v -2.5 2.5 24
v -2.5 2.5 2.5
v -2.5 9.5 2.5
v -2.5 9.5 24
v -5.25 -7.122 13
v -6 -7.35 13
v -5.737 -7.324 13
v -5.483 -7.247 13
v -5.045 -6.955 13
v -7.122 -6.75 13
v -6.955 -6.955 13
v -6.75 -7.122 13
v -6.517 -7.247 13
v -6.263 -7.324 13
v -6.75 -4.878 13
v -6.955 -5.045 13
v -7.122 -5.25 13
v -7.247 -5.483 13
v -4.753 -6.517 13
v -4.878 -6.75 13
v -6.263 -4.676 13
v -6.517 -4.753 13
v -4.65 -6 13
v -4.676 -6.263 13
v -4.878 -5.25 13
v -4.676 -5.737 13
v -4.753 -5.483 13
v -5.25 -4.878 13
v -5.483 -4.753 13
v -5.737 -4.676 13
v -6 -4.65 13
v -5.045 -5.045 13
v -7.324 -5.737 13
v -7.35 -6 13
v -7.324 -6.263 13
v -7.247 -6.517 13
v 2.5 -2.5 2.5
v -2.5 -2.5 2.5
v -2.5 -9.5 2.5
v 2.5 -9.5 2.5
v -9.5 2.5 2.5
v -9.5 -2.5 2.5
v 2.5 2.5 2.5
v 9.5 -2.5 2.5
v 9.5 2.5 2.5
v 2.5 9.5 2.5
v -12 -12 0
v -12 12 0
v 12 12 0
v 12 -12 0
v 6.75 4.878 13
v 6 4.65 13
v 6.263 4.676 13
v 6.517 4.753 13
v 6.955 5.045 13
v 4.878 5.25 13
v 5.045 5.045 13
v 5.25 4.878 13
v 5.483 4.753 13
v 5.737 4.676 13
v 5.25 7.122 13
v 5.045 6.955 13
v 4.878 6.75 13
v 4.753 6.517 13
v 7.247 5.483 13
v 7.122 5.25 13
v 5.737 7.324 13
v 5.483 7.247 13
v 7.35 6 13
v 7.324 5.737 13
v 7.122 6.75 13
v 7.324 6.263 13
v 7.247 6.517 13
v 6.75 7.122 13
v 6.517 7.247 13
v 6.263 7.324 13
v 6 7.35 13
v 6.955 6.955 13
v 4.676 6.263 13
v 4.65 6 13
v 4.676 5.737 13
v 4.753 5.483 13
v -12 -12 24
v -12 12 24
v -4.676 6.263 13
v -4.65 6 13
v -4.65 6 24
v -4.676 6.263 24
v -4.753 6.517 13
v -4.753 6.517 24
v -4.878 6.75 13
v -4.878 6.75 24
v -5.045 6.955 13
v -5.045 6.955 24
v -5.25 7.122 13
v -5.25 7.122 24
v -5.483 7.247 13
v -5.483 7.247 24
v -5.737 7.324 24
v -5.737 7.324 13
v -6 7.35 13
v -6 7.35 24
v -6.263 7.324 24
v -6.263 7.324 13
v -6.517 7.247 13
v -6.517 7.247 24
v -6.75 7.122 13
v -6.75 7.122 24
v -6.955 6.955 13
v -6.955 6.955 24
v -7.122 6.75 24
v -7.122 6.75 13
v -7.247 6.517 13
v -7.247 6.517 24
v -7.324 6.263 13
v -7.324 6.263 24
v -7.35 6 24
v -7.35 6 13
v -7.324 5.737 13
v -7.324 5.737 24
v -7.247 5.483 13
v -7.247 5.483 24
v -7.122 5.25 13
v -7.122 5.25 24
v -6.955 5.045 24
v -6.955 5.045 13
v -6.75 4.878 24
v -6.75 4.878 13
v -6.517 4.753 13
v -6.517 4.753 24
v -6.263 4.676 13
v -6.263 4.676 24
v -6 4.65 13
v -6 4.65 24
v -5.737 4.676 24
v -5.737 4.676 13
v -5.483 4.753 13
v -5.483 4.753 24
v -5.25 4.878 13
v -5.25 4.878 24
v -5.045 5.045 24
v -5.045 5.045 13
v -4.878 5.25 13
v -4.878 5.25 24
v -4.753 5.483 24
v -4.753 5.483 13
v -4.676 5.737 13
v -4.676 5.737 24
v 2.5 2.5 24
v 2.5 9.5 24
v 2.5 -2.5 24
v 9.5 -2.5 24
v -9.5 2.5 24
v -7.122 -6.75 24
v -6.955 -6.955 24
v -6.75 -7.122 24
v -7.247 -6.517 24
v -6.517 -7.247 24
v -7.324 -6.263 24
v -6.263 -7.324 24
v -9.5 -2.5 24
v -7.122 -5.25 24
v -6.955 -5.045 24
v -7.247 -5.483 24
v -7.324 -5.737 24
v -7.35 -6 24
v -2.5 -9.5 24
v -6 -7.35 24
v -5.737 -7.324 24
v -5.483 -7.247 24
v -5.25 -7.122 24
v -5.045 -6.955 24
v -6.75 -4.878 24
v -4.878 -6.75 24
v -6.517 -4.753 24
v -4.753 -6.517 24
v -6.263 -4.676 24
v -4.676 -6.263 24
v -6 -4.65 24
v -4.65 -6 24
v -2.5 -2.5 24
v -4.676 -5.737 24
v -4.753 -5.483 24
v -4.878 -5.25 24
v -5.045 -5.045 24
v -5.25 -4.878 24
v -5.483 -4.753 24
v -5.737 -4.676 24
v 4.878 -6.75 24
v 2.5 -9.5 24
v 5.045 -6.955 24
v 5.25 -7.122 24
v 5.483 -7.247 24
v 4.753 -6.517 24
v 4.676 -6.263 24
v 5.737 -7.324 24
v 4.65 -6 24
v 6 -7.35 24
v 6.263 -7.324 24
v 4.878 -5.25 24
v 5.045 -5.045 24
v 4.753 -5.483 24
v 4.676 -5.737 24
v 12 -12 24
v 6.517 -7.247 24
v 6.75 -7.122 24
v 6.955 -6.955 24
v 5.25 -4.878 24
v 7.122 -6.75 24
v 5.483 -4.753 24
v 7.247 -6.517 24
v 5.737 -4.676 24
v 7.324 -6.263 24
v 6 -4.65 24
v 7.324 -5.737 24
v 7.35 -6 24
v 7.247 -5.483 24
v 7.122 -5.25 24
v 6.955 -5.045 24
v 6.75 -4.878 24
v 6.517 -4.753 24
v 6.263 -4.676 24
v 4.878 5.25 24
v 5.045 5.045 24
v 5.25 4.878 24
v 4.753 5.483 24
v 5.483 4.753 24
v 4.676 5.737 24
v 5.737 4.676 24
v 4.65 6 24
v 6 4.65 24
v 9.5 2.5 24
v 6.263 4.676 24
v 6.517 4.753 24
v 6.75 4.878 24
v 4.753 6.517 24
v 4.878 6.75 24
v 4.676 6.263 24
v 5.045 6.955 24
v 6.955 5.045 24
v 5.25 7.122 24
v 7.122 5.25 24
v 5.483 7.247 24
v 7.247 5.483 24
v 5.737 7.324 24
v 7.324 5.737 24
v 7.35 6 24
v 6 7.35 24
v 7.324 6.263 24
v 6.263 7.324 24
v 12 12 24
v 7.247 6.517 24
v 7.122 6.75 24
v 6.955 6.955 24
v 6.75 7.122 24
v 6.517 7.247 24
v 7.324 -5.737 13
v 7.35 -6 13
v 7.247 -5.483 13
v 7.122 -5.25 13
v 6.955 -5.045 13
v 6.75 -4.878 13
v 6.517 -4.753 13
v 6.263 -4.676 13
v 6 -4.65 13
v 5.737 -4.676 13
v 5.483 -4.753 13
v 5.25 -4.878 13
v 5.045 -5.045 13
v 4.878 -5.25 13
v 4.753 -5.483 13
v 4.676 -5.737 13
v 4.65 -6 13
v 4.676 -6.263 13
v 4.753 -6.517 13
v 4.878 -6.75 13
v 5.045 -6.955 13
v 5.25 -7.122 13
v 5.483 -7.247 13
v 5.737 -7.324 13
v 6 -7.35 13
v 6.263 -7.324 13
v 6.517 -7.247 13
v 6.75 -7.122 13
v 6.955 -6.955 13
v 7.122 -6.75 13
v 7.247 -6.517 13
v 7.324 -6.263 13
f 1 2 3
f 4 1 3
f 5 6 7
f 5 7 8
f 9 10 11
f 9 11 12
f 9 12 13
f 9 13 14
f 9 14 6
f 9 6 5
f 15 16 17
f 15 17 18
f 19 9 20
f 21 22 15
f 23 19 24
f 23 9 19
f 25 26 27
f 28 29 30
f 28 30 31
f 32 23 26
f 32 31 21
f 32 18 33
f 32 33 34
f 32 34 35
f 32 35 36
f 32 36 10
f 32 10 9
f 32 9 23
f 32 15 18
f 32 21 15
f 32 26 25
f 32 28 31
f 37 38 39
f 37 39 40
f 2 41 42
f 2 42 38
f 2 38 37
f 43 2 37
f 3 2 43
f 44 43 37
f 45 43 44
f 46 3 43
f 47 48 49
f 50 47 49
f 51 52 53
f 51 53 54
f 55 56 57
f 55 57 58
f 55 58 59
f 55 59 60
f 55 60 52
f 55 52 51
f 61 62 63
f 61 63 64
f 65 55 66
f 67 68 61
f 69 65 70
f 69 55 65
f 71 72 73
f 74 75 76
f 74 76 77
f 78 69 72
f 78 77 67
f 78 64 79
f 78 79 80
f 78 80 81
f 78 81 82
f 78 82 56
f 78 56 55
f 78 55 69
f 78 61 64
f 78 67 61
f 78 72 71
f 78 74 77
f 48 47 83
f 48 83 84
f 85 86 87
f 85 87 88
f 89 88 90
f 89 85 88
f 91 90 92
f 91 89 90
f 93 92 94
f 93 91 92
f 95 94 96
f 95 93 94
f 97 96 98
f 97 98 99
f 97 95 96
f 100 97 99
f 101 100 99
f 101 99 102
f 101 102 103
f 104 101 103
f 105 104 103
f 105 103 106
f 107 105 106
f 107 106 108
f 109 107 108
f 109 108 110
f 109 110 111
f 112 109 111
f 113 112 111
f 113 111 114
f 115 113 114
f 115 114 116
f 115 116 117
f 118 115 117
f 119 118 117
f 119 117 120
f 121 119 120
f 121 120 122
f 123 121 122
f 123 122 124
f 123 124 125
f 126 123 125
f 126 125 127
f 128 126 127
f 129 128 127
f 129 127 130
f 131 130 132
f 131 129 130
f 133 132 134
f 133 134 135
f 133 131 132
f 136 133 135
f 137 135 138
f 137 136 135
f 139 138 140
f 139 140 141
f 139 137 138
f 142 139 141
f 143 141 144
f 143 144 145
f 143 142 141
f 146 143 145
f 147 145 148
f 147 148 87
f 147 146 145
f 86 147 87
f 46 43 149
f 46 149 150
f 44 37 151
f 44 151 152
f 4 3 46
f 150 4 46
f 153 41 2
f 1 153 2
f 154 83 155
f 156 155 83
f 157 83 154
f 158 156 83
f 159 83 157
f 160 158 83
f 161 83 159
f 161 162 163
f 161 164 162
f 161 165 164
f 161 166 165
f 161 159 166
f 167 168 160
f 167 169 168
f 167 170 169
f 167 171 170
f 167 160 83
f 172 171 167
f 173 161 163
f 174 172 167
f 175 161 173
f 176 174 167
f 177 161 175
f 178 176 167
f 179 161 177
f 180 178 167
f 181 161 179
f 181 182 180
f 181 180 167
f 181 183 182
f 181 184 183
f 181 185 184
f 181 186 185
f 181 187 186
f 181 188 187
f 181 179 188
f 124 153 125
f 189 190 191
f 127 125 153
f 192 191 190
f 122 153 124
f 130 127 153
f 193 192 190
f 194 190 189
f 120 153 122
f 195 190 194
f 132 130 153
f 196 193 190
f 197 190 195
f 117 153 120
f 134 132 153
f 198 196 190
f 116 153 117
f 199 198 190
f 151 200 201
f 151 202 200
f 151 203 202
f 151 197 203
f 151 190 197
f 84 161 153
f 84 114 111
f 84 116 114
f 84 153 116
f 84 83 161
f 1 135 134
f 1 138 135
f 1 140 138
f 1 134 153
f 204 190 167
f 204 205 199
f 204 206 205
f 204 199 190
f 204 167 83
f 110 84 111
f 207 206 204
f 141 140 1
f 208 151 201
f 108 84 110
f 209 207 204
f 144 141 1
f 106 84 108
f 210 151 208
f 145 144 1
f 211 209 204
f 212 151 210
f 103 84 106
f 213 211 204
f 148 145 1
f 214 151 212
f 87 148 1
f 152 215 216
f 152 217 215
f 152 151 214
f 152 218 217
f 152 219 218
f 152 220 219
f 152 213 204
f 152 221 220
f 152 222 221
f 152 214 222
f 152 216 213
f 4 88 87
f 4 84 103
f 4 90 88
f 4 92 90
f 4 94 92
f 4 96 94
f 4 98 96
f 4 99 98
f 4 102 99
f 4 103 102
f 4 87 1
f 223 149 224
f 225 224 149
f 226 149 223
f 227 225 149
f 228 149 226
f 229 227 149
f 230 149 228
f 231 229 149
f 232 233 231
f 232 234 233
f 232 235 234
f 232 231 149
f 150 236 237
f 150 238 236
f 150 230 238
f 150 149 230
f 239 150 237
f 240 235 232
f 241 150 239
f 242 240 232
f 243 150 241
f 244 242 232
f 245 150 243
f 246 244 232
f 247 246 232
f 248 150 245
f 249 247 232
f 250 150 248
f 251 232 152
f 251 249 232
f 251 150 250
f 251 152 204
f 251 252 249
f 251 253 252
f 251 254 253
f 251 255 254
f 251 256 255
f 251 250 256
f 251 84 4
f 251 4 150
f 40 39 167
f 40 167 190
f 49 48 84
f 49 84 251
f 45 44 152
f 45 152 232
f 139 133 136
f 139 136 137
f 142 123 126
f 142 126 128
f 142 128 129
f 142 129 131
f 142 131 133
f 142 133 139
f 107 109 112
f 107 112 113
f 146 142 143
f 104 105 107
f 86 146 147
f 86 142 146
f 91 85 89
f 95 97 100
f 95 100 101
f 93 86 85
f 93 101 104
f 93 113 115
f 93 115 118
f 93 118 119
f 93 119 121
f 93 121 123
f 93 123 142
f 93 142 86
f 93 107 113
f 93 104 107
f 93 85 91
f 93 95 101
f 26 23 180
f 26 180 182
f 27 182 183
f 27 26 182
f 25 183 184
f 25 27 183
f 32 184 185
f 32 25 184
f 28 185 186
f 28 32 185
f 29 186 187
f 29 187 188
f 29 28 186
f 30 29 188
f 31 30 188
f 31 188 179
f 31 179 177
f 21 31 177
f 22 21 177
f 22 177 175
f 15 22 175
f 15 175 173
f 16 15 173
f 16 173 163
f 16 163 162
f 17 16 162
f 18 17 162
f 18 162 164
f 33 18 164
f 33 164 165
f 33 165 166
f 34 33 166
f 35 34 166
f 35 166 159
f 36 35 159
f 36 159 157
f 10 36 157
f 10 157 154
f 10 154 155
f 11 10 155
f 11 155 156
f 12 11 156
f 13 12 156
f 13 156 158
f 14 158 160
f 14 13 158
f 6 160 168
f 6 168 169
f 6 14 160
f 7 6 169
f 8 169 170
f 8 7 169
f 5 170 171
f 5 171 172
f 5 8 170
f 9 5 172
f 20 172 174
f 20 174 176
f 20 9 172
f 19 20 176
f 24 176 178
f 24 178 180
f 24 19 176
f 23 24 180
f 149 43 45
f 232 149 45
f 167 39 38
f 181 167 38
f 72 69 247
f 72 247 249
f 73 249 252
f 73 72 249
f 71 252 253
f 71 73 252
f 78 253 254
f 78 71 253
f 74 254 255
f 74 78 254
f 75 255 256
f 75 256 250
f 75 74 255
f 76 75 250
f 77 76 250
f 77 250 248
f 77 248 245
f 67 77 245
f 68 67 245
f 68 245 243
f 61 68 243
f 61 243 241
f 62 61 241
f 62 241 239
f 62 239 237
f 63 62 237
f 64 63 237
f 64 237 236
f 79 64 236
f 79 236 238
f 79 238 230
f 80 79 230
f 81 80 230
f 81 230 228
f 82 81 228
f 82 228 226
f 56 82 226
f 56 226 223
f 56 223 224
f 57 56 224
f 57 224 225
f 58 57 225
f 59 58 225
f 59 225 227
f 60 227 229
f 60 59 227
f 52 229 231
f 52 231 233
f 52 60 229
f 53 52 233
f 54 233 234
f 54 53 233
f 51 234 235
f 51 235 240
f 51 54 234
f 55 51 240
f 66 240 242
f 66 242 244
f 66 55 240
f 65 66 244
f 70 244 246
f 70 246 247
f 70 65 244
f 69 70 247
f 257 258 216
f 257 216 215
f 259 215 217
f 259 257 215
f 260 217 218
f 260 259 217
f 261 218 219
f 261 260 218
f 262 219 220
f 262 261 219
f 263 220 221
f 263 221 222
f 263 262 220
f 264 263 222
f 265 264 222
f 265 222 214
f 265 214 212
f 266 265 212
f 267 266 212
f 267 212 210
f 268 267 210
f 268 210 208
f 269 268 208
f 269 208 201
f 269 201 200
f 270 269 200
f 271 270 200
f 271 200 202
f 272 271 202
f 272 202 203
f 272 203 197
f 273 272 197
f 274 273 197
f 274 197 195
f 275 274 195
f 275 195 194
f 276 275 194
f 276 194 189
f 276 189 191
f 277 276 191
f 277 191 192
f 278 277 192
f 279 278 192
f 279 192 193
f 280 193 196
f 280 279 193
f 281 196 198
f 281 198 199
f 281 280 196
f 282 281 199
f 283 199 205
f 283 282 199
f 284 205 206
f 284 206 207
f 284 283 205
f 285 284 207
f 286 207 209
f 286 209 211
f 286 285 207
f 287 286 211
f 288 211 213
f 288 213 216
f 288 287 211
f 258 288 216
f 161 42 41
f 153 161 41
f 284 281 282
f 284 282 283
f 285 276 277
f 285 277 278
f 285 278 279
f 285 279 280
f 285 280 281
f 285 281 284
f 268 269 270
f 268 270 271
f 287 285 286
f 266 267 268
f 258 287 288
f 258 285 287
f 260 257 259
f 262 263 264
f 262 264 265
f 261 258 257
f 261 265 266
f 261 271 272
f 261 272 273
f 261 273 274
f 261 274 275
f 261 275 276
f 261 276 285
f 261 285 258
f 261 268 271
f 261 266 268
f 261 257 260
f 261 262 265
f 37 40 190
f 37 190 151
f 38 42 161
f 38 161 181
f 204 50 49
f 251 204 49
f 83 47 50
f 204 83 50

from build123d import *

# Parameters (mm, degrees)
F0_W     = 24
F0_H     = 24
F0_W_2   = 7
F0_H_2   = 7
F0_R     = 1.35
F1_DEPTH = 24
F2_T     = -2.5
F3_DEPTH = 24
F4_DEPTH = 13


with BuildPart() as f1:
    # F0 (on Top) → F1 (new body)
    with BuildSketch(Plane.XY):
        Rectangle(F0_W, F0_H)
        with Locations((-6, -6)):
            Rectangle(F0_W_2, F0_H_2, mode=Mode.SUBTRACT)
        with Locations((6, -6)):
            Rectangle(F0_W_2, F0_H_2, mode=Mode.SUBTRACT)
        with Locations((-6, 6)):
            Rectangle(F0_W_2, F0_H_2, mode=Mode.SUBTRACT)
        with Locations((6, 6)):
            Rectangle(F0_W_2, F0_H_2, mode=Mode.SUBTRACT)
        with Locations((-6, 6)):
            Rectangle(F0_W_2, F0_H_2)
        with Locations((-6, 6)):
            Circle(F0_R, mode=Mode.SUBTRACT)
        with Locations((-6, 6)):
            Circle(F0_R)
        with Locations((6, 6)):
            Rectangle(F0_W_2, F0_H_2)
        with Locations((6, 6)):
            Circle(F0_R, mode=Mode.SUBTRACT)
        with Locations((6, 6)):
            Circle(F0_R)
        with Locations((6, -6)):
            Rectangle(F0_W_2, F0_H_2)
        with Locations((6, -6)):
            Circle(F0_R, mode=Mode.SUBTRACT)
        with Locations((6, -6)):
            Circle(F0_R)
        with Locations((-6, -6)):
            Rectangle(F0_W_2, F0_H_2)
        with Locations((-6, -6)):
            Circle(F0_R, mode=Mode.SUBTRACT)
        with Locations((-6, -6)):
            Circle(F0_R)
    extrude(amount=F1_DEPTH)

    # F2
    f2_openings = [f1.faces().sort_by_distance(p)[0] for p in [
        (0, 0, 24),
    ]]
    offset(amount=F2_T, openings=f2_openings)

    # F0 (on Top) → F3 (join)
    with BuildSketch(Plane.XY):
        with Locations((-6, 6)):
            Rectangle(F0_W_2, F0_H_2)
        with Locations((-6, 6)):
            Circle(F0_R, mode=Mode.SUBTRACT)
        with Locations((-6, -6)):
            Rectangle(F0_W_2, F0_H_2)
        with Locations((-6, -6)):
            Circle(F0_R, mode=Mode.SUBTRACT)
        with Locations((6, -6)):
            Rectangle(F0_W_2, F0_H_2)
        with Locations((6, -6)):
            Circle(F0_R, mode=Mode.SUBTRACT)
        with Locations((6, 6)):
            Rectangle(F0_W_2, F0_H_2)
        with Locations((6, 6)):
            Circle(F0_R, mode=Mode.SUBTRACT)
    extrude(amount=F3_DEPTH)

    # F0 (on Top) → F4 (join)
    with BuildSketch(Plane.XY):
        with Locations((-6, 6)):
            Circle(F0_R)
        with Locations((-6, -6)):
            Circle(F0_R)
        with Locations((6, -6)):
            Circle(F0_R)
        with Locations((6, 6)):
            Circle(F0_R)
    extrude(amount=F4_DEPTH)


solid = f1.part
